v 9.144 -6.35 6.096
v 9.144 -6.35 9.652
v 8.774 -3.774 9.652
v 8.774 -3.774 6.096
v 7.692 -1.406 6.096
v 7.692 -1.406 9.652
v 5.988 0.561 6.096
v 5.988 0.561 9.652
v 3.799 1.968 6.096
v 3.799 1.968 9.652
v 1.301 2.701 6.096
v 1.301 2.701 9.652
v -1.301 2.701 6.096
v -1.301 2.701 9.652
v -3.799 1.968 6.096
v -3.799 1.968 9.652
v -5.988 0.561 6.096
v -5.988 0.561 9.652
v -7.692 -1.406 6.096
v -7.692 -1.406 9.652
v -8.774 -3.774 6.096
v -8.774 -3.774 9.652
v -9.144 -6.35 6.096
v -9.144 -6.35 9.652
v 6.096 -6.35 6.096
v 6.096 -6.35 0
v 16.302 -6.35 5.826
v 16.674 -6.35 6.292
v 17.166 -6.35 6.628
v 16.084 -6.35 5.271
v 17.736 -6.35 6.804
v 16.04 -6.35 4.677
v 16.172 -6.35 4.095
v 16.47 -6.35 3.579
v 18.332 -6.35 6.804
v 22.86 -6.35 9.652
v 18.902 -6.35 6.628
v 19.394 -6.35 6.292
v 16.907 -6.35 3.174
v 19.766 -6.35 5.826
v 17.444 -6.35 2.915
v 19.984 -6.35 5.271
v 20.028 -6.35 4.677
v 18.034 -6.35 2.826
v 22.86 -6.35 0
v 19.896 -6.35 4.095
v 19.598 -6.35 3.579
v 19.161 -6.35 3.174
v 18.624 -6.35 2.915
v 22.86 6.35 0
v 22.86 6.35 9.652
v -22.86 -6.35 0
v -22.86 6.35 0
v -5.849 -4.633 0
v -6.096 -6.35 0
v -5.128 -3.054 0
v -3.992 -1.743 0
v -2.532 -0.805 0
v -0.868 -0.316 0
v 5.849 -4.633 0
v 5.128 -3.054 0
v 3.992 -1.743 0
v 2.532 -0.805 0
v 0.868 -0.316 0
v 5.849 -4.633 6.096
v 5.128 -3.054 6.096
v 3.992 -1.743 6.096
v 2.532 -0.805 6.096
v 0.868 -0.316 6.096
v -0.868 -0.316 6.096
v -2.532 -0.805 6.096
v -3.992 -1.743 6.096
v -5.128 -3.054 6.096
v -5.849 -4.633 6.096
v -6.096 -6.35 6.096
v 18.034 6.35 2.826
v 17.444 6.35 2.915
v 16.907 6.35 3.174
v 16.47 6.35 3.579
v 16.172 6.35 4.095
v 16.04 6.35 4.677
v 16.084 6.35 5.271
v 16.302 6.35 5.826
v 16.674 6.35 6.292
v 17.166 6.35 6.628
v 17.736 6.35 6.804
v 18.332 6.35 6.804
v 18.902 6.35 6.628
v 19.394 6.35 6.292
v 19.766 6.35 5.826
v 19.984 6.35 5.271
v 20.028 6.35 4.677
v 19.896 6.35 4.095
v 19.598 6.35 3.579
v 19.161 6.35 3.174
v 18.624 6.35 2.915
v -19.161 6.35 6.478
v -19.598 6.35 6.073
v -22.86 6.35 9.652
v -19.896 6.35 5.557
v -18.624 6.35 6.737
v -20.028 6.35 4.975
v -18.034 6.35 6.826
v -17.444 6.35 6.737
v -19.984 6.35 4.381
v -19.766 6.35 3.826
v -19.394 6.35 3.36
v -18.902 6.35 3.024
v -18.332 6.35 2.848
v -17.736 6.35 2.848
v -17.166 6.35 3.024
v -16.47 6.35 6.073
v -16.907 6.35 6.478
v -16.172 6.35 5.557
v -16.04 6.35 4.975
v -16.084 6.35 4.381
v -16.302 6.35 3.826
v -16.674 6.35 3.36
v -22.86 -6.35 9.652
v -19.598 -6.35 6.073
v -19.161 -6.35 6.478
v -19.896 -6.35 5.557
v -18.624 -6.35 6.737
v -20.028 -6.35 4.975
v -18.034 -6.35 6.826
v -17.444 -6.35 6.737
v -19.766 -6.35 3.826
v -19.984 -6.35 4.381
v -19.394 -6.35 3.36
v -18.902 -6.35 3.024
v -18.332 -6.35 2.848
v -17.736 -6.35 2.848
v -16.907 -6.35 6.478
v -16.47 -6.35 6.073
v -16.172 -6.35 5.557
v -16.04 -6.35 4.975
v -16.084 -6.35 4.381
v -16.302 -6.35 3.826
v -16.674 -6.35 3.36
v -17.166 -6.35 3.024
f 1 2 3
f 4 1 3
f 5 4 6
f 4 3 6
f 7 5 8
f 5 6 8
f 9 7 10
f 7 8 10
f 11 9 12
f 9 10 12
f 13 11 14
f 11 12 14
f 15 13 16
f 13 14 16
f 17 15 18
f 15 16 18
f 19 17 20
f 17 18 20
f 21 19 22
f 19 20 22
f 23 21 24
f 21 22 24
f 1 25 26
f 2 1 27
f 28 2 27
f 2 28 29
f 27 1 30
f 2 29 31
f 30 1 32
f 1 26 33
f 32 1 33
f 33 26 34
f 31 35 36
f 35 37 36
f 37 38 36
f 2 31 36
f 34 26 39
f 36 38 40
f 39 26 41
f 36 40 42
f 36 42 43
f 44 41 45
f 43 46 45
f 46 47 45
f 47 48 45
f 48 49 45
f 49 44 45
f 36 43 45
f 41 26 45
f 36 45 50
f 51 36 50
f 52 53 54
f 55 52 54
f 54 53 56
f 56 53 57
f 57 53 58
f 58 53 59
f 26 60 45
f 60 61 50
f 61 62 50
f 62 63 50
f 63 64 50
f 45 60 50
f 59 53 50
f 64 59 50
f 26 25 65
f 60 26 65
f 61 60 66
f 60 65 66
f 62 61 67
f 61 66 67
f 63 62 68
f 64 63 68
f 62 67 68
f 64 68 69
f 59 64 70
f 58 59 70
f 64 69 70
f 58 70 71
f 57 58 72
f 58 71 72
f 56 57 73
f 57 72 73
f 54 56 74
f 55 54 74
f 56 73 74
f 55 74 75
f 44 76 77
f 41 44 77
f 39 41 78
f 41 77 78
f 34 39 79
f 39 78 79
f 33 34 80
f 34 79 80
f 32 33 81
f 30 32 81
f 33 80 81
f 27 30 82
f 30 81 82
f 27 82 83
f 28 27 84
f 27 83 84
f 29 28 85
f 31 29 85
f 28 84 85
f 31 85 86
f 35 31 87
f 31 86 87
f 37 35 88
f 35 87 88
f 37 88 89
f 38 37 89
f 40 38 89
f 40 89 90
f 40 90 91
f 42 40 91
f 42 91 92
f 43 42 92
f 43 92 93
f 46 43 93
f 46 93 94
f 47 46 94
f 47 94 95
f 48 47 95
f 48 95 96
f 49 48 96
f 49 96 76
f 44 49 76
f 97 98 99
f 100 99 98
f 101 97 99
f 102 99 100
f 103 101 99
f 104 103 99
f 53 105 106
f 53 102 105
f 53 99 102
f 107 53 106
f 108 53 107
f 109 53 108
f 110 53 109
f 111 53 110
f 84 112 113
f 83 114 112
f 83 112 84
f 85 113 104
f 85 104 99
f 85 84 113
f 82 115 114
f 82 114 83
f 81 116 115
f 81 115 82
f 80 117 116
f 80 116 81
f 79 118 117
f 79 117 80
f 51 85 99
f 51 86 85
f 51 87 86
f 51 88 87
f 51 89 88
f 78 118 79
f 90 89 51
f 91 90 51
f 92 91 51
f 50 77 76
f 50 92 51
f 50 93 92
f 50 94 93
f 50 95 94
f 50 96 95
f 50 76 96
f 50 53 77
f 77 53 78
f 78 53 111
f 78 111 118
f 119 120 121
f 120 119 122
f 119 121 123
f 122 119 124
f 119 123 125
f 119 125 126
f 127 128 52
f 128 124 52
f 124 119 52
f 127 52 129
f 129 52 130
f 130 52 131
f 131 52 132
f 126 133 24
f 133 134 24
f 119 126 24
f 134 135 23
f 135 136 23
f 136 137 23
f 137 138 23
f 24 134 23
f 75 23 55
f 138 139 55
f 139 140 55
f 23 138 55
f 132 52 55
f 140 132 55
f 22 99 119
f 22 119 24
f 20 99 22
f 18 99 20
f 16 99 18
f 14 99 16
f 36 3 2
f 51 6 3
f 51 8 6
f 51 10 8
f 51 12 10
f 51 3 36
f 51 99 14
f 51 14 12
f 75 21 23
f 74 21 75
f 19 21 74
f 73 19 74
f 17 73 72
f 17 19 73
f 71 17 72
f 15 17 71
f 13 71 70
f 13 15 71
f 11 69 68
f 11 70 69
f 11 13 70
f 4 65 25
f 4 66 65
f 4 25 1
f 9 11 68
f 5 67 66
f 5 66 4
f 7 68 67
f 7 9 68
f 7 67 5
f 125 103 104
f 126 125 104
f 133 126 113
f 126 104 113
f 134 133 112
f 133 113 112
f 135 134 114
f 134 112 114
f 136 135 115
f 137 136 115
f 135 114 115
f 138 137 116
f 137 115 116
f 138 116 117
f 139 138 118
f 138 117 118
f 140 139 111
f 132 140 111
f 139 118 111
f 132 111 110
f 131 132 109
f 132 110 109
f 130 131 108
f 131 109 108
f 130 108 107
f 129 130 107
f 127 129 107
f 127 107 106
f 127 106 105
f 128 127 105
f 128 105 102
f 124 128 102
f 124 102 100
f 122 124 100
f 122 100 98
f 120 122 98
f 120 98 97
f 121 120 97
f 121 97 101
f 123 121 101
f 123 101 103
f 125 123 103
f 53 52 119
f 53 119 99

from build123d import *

# Parameters (mm, degrees)
SKETCH1_W           = 45.72
SKETCH1_H           = 12.7
BOSS_EXTRUDE1_DEPTH = 9.652
CUT_EXTRUDE3_DEPTH  = 3.556
CUT_EXTRUDE5_DEPTH  = 25.496189826
SKETCH4_R           = 2
CUT_EXTRUDE6_DEPTH  = 28.875270474


with BuildPart() as part:
    # Sketch1 → Boss-Extrude1 (new body)
    with BuildSketch(Plane.XY):
        Rectangle(SKETCH1_W, SKETCH1_H)
    extrude(amount=BOSS_EXTRUDE1_DEPTH)

    # Sketch2 → Cut-Extrude3 (cut)
    with BuildSketch(Plane.XY.offset(9.652)):
        with BuildLine():
            Line((-9.144, -6.35), (9.144, -6.35))
            ThreePointArc((9.144, -6.35), (0, 2.794), (-9.144, -6.35))
        make_face()
    extrude(amount=-CUT_EXTRUDE3_DEPTH, mode=Mode.SUBTRACT)

    # Sketch3 → Cut-Extrude5 (cut, through all)
    with BuildSketch(Plane.XY.offset(6.096)):
        with BuildLine():
            Line((-6.096, -6.35), (6.096, -6.35))
            ThreePointArc((6.096, -6.35), (0, -0.254), (-6.096, -6.35))
        make_face()
    extrude(amount=-CUT_EXTRUDE5_DEPTH, mode=Mode.SUBTRACT)

    # Sketch4 → Cut-Extrude6 (cut, through all)
    with BuildSketch(Plane(origin=(0, 6.35, 0), x_dir=(1, 0, 0), z_dir=(0, 1, 0))):
        with Locations((-18.034, -4.826)):
            Circle(SKETCH4_R)
        with Locations((18.034, -4.826)):
            Circle(SKETCH4_R)
    extrude(amount=-CUT_EXTRUDE6_DEPTH, mode=Mode.SUBTRACT)


solid = part.part
